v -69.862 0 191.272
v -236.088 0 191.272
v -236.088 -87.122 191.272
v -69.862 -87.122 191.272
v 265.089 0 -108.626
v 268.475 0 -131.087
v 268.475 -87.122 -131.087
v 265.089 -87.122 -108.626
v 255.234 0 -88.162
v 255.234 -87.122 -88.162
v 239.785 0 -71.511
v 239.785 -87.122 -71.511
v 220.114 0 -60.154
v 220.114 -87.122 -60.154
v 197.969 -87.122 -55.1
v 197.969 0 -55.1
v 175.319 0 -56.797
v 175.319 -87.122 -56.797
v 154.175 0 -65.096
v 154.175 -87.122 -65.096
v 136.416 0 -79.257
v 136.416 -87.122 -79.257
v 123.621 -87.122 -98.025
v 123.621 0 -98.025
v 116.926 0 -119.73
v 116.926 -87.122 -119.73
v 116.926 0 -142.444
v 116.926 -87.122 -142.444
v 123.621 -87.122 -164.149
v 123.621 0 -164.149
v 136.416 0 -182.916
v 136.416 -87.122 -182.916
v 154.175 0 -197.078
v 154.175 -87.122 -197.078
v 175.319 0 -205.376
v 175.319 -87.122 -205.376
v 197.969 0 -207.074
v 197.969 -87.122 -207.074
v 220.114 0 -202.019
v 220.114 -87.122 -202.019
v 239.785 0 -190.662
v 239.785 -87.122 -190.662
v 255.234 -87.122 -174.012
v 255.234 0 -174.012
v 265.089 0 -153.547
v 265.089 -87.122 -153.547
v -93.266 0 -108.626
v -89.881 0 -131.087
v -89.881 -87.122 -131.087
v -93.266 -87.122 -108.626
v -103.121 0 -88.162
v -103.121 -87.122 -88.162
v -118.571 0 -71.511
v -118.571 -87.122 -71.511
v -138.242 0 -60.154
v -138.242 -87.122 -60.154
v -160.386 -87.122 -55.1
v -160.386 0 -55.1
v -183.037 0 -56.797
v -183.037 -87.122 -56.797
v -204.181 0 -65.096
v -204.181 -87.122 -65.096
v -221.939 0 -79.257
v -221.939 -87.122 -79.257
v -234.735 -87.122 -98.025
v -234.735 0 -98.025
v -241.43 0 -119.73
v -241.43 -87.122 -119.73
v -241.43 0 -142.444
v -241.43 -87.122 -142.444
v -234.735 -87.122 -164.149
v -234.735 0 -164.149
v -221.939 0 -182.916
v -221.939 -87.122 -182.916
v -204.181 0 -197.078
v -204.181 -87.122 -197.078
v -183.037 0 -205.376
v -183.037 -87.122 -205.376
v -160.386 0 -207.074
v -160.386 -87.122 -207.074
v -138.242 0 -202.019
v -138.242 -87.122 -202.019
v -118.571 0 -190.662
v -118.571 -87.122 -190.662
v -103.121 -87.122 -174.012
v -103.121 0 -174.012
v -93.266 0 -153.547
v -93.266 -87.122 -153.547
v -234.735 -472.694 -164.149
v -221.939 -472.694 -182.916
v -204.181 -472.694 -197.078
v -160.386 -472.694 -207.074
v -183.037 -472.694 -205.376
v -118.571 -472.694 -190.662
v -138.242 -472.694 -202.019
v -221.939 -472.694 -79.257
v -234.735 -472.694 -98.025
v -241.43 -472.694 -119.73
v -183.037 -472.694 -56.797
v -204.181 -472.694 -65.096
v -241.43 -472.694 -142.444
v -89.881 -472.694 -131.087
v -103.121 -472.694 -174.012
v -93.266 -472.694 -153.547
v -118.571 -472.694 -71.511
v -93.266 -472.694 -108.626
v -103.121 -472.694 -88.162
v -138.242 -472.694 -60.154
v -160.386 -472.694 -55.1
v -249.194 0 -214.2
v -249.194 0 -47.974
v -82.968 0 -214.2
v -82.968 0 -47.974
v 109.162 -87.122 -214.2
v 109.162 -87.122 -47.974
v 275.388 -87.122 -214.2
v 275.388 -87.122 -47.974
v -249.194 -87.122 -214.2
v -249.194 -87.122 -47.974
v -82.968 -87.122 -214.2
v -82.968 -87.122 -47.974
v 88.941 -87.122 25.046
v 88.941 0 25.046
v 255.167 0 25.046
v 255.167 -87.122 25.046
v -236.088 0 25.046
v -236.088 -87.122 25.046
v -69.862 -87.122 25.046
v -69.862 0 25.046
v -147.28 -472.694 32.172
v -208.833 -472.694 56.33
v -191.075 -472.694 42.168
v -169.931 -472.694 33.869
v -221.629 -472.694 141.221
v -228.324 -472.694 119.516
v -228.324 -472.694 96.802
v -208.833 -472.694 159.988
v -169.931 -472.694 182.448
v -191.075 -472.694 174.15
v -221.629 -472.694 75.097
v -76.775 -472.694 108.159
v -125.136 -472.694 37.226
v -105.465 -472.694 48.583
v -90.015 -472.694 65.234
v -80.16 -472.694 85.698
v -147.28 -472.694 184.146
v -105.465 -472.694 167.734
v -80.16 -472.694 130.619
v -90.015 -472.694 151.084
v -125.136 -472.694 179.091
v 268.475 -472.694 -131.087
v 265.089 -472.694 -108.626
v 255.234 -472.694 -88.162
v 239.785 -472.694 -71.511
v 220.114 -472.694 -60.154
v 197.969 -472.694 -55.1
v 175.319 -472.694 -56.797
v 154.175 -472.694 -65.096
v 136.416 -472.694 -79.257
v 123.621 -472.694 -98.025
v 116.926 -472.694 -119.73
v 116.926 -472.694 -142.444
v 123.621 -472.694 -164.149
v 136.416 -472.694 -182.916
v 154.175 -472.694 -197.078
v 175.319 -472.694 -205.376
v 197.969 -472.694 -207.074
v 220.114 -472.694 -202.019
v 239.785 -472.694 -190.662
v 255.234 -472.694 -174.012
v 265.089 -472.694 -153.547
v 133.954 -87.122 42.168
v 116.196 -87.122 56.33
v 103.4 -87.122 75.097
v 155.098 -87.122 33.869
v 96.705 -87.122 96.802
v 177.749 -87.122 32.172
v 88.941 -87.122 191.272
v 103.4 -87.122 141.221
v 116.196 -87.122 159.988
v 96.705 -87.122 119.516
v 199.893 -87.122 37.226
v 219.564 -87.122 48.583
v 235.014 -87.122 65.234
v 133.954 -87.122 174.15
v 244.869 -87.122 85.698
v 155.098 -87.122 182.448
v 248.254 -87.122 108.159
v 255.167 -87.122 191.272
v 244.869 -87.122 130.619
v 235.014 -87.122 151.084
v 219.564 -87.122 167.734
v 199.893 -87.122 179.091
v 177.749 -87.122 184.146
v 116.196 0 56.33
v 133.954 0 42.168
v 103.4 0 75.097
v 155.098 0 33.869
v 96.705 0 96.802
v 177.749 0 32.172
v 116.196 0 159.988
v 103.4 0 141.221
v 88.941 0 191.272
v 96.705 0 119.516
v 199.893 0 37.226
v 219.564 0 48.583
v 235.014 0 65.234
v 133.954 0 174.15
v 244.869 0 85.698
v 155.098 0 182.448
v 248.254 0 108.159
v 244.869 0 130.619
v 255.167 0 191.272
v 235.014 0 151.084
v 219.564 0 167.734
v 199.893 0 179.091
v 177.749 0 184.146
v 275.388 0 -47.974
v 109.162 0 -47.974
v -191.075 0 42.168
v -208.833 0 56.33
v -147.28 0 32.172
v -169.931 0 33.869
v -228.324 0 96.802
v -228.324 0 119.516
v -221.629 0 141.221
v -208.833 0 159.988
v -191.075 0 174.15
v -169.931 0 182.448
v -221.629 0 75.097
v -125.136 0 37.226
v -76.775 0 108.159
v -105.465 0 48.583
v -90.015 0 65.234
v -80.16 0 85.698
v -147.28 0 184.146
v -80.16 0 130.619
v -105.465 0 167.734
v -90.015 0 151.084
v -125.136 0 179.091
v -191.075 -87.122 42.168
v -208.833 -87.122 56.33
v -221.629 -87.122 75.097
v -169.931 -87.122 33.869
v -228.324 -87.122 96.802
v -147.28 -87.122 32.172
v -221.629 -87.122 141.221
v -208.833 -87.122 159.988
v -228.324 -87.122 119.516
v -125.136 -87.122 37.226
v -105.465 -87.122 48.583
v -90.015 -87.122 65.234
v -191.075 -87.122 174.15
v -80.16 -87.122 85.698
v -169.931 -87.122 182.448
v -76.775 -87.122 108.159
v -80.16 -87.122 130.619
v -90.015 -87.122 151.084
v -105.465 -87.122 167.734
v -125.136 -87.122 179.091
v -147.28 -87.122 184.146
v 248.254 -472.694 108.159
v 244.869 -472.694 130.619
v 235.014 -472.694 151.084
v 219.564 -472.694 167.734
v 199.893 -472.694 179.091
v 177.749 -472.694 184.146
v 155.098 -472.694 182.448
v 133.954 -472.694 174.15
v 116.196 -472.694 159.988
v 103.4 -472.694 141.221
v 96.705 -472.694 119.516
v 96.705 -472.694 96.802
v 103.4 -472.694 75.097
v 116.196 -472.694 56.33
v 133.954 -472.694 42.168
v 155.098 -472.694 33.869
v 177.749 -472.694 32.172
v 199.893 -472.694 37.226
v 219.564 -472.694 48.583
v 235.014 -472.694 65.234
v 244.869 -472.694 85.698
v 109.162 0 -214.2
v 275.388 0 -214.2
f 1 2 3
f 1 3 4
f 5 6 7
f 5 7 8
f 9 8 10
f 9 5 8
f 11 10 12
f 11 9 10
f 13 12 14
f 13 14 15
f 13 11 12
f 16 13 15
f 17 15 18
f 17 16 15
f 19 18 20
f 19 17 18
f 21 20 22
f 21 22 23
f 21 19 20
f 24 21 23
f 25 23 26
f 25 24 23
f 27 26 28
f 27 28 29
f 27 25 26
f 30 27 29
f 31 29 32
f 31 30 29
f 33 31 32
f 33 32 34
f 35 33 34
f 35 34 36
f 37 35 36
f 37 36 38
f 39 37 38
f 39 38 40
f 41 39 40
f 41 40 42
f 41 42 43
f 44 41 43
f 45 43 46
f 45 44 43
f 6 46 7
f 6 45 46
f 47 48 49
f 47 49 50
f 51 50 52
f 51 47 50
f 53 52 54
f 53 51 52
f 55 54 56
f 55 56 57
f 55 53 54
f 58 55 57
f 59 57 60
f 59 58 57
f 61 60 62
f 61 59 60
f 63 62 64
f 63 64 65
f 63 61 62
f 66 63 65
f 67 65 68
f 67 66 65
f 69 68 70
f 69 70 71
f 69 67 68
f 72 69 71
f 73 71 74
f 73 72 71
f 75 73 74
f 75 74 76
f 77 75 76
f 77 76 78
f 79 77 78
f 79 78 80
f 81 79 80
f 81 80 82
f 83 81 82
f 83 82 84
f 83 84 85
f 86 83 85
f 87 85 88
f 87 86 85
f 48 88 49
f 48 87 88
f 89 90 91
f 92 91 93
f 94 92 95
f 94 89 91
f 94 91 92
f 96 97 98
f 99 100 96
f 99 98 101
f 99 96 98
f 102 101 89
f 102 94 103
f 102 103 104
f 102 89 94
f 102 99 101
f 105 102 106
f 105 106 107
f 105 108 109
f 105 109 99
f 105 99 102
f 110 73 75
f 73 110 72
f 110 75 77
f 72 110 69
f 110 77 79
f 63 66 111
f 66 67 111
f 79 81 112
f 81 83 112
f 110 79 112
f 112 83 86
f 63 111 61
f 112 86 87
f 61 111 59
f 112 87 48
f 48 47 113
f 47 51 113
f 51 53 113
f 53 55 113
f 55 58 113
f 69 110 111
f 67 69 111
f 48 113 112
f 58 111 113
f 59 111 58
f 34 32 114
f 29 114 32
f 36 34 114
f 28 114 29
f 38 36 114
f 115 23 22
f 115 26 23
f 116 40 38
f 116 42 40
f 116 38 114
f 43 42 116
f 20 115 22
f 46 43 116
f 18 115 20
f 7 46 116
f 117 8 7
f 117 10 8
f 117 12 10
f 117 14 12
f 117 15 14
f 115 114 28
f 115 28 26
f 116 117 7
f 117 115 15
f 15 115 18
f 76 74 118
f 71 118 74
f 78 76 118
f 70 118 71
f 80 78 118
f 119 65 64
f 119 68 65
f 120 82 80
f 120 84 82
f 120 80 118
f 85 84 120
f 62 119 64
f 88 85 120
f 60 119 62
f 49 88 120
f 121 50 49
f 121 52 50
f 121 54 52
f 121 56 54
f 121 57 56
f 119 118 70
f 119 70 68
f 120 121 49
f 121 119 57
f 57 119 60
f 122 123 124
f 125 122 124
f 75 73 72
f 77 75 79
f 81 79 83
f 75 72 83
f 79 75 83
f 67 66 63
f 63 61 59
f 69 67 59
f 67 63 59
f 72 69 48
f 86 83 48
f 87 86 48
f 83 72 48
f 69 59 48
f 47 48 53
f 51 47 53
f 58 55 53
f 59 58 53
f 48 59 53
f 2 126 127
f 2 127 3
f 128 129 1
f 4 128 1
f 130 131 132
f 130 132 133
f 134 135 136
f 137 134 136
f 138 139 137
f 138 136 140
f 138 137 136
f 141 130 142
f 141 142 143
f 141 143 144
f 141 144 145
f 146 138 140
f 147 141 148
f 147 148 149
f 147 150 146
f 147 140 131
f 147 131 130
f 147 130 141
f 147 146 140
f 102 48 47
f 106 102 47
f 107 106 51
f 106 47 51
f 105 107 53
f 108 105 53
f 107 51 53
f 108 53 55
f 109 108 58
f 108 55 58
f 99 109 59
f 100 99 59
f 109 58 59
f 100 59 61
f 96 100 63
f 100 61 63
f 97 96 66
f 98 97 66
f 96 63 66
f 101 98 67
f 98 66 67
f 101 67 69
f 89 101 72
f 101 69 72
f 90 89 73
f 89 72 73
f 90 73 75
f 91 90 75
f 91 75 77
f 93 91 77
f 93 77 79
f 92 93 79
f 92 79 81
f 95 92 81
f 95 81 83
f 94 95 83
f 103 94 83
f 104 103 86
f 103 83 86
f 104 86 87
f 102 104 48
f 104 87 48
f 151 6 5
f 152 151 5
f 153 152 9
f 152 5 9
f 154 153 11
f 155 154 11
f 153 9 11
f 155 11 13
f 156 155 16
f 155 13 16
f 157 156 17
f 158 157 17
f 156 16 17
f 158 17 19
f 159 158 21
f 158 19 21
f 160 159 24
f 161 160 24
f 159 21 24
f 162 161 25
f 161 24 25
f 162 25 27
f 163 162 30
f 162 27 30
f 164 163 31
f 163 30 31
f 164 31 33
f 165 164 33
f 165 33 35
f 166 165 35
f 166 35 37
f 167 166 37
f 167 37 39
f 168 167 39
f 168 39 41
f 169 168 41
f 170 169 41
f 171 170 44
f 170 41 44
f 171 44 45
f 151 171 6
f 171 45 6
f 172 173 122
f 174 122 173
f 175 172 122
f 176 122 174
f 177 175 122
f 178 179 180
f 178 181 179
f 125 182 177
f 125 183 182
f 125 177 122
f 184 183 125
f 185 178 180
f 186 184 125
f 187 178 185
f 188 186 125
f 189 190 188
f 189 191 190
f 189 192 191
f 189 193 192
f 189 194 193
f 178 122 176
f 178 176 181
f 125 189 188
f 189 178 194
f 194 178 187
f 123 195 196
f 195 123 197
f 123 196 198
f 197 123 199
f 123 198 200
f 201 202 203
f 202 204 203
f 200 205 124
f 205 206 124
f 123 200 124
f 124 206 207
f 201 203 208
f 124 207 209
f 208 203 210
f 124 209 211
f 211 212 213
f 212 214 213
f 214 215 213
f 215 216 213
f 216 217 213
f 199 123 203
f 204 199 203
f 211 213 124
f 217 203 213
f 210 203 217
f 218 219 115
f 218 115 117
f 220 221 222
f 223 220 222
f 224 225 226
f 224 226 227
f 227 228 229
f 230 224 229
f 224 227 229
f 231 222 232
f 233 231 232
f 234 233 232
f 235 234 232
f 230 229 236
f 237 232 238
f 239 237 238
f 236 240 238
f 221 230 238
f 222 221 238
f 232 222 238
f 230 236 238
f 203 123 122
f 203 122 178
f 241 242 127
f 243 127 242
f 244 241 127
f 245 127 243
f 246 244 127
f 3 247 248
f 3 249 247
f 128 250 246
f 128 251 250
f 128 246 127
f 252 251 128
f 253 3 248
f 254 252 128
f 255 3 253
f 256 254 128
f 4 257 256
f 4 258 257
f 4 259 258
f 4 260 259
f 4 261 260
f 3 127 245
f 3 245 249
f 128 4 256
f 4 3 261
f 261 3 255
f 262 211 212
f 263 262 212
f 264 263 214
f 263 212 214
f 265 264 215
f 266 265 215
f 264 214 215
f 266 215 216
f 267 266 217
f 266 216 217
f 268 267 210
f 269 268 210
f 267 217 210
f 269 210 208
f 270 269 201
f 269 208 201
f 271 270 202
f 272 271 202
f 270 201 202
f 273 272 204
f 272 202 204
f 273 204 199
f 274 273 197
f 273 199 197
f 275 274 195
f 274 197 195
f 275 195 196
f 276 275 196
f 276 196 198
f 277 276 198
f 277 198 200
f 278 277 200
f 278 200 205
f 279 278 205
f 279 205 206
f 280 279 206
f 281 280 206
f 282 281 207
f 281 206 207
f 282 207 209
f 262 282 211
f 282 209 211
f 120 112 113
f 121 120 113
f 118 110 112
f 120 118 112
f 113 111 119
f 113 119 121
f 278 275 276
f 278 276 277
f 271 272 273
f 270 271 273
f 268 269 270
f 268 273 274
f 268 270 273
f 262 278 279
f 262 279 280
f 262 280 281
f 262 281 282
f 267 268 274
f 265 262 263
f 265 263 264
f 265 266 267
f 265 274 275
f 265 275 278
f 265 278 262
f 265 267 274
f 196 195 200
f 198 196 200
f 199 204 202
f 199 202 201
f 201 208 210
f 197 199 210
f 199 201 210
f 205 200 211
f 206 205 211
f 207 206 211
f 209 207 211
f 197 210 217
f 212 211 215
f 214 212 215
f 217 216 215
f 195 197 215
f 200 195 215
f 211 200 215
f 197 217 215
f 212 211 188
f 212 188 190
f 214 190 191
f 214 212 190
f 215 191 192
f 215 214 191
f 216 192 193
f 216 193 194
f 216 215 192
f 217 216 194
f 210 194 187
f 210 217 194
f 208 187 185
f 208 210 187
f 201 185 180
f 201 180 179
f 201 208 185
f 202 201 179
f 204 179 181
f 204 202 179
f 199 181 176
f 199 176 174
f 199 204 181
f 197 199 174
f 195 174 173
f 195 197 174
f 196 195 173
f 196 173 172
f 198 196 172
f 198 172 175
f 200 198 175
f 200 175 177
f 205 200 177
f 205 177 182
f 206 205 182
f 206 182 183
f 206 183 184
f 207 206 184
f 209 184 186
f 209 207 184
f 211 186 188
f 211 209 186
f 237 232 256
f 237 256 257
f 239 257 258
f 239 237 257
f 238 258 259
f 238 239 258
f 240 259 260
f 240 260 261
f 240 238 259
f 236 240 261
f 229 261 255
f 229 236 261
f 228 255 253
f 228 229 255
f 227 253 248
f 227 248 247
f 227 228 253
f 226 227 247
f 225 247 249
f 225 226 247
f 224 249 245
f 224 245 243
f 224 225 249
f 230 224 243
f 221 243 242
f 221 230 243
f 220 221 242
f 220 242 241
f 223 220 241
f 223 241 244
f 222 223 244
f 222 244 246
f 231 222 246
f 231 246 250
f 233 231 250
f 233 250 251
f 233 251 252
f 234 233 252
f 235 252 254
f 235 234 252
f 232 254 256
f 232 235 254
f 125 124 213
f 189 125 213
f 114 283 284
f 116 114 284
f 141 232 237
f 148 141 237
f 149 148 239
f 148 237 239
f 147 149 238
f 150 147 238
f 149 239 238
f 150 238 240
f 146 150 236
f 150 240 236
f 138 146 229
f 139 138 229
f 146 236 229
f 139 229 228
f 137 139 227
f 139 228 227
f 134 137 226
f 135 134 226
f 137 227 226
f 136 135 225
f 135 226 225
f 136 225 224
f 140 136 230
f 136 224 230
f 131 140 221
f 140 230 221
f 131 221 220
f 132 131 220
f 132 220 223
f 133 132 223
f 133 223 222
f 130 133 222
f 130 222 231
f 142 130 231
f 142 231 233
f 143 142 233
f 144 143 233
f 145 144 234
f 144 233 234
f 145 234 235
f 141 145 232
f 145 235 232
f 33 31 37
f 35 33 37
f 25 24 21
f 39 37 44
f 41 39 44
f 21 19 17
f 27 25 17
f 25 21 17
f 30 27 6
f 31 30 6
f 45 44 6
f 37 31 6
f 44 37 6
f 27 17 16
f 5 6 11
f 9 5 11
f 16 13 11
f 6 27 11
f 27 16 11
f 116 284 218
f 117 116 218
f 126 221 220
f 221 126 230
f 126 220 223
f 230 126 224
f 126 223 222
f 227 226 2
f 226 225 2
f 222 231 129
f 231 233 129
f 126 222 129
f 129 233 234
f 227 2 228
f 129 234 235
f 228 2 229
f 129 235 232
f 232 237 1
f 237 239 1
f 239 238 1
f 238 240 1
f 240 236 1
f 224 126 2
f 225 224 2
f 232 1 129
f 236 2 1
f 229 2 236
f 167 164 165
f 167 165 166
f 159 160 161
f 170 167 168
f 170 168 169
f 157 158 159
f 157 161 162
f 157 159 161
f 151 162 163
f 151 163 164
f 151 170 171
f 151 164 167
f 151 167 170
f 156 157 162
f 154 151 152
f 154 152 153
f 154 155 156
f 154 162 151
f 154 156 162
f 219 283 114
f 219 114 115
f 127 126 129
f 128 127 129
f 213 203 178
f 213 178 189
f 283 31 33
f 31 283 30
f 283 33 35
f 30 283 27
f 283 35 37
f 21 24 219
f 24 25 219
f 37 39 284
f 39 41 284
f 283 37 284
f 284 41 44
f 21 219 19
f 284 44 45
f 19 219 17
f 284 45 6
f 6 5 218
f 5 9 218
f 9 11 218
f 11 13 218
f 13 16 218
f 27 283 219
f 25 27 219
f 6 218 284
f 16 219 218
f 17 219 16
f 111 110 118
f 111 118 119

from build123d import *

# Parameters (mm, degrees)
F0_W     = 166.225975
F0_H     = 166.225975
F0_R     = 76.2
F1_DEPTH = 87.122
F2_DEPTH = 472.694


with BuildPart() as f1:
    # F0 (on Front) → F1 (new body)
    with BuildSketch(Plane.XZ):
        with Locations((-152.974857, 108.158693)):
            Rectangle(F0_W, F0_H)
        with Locations((-152.974858, 108.158693)):
            Circle(F0_R, mode=Mode.SUBTRACT)
        with Locations((-166.080866, -131.086642)):
            Rectangle(F0_W, F0_H)
        with Locations((-166.080866, -131.086643)):
            Circle(F0_R, mode=Mode.SUBTRACT)
        with Locations((192.274796, -131.086642)):
            Rectangle(F0_W, F0_H)
        with Locations((192.274795, -131.086643)):
            Circle(F0_R, mode=Mode.SUBTRACT)
        with Locations((172.054114, 108.158693)):
            Rectangle(F0_W, F0_H)
        with Locations((172.054115, 108.158693)):
            Circle(F0_R, mode=Mode.SUBTRACT)
    extrude(amount=F1_DEPTH)


with BuildPart() as f2:
    # F0 (on Front) → F2 (new body)
    with BuildSketch(Plane.XZ):
        with Locations((-166.080866, -131.086643)):
            Circle(F0_R)
        with Locations((-152.974858, 108.158693)):
            Circle(F0_R)
        with Locations((172.054115, 108.158693)):
            Circle(F0_R)
        with Locations((192.274795, -131.086643)):
            Circle(F0_R)
    extrude(amount=F2_DEPTH)


solid = Compound([f1.part, f2.part])
